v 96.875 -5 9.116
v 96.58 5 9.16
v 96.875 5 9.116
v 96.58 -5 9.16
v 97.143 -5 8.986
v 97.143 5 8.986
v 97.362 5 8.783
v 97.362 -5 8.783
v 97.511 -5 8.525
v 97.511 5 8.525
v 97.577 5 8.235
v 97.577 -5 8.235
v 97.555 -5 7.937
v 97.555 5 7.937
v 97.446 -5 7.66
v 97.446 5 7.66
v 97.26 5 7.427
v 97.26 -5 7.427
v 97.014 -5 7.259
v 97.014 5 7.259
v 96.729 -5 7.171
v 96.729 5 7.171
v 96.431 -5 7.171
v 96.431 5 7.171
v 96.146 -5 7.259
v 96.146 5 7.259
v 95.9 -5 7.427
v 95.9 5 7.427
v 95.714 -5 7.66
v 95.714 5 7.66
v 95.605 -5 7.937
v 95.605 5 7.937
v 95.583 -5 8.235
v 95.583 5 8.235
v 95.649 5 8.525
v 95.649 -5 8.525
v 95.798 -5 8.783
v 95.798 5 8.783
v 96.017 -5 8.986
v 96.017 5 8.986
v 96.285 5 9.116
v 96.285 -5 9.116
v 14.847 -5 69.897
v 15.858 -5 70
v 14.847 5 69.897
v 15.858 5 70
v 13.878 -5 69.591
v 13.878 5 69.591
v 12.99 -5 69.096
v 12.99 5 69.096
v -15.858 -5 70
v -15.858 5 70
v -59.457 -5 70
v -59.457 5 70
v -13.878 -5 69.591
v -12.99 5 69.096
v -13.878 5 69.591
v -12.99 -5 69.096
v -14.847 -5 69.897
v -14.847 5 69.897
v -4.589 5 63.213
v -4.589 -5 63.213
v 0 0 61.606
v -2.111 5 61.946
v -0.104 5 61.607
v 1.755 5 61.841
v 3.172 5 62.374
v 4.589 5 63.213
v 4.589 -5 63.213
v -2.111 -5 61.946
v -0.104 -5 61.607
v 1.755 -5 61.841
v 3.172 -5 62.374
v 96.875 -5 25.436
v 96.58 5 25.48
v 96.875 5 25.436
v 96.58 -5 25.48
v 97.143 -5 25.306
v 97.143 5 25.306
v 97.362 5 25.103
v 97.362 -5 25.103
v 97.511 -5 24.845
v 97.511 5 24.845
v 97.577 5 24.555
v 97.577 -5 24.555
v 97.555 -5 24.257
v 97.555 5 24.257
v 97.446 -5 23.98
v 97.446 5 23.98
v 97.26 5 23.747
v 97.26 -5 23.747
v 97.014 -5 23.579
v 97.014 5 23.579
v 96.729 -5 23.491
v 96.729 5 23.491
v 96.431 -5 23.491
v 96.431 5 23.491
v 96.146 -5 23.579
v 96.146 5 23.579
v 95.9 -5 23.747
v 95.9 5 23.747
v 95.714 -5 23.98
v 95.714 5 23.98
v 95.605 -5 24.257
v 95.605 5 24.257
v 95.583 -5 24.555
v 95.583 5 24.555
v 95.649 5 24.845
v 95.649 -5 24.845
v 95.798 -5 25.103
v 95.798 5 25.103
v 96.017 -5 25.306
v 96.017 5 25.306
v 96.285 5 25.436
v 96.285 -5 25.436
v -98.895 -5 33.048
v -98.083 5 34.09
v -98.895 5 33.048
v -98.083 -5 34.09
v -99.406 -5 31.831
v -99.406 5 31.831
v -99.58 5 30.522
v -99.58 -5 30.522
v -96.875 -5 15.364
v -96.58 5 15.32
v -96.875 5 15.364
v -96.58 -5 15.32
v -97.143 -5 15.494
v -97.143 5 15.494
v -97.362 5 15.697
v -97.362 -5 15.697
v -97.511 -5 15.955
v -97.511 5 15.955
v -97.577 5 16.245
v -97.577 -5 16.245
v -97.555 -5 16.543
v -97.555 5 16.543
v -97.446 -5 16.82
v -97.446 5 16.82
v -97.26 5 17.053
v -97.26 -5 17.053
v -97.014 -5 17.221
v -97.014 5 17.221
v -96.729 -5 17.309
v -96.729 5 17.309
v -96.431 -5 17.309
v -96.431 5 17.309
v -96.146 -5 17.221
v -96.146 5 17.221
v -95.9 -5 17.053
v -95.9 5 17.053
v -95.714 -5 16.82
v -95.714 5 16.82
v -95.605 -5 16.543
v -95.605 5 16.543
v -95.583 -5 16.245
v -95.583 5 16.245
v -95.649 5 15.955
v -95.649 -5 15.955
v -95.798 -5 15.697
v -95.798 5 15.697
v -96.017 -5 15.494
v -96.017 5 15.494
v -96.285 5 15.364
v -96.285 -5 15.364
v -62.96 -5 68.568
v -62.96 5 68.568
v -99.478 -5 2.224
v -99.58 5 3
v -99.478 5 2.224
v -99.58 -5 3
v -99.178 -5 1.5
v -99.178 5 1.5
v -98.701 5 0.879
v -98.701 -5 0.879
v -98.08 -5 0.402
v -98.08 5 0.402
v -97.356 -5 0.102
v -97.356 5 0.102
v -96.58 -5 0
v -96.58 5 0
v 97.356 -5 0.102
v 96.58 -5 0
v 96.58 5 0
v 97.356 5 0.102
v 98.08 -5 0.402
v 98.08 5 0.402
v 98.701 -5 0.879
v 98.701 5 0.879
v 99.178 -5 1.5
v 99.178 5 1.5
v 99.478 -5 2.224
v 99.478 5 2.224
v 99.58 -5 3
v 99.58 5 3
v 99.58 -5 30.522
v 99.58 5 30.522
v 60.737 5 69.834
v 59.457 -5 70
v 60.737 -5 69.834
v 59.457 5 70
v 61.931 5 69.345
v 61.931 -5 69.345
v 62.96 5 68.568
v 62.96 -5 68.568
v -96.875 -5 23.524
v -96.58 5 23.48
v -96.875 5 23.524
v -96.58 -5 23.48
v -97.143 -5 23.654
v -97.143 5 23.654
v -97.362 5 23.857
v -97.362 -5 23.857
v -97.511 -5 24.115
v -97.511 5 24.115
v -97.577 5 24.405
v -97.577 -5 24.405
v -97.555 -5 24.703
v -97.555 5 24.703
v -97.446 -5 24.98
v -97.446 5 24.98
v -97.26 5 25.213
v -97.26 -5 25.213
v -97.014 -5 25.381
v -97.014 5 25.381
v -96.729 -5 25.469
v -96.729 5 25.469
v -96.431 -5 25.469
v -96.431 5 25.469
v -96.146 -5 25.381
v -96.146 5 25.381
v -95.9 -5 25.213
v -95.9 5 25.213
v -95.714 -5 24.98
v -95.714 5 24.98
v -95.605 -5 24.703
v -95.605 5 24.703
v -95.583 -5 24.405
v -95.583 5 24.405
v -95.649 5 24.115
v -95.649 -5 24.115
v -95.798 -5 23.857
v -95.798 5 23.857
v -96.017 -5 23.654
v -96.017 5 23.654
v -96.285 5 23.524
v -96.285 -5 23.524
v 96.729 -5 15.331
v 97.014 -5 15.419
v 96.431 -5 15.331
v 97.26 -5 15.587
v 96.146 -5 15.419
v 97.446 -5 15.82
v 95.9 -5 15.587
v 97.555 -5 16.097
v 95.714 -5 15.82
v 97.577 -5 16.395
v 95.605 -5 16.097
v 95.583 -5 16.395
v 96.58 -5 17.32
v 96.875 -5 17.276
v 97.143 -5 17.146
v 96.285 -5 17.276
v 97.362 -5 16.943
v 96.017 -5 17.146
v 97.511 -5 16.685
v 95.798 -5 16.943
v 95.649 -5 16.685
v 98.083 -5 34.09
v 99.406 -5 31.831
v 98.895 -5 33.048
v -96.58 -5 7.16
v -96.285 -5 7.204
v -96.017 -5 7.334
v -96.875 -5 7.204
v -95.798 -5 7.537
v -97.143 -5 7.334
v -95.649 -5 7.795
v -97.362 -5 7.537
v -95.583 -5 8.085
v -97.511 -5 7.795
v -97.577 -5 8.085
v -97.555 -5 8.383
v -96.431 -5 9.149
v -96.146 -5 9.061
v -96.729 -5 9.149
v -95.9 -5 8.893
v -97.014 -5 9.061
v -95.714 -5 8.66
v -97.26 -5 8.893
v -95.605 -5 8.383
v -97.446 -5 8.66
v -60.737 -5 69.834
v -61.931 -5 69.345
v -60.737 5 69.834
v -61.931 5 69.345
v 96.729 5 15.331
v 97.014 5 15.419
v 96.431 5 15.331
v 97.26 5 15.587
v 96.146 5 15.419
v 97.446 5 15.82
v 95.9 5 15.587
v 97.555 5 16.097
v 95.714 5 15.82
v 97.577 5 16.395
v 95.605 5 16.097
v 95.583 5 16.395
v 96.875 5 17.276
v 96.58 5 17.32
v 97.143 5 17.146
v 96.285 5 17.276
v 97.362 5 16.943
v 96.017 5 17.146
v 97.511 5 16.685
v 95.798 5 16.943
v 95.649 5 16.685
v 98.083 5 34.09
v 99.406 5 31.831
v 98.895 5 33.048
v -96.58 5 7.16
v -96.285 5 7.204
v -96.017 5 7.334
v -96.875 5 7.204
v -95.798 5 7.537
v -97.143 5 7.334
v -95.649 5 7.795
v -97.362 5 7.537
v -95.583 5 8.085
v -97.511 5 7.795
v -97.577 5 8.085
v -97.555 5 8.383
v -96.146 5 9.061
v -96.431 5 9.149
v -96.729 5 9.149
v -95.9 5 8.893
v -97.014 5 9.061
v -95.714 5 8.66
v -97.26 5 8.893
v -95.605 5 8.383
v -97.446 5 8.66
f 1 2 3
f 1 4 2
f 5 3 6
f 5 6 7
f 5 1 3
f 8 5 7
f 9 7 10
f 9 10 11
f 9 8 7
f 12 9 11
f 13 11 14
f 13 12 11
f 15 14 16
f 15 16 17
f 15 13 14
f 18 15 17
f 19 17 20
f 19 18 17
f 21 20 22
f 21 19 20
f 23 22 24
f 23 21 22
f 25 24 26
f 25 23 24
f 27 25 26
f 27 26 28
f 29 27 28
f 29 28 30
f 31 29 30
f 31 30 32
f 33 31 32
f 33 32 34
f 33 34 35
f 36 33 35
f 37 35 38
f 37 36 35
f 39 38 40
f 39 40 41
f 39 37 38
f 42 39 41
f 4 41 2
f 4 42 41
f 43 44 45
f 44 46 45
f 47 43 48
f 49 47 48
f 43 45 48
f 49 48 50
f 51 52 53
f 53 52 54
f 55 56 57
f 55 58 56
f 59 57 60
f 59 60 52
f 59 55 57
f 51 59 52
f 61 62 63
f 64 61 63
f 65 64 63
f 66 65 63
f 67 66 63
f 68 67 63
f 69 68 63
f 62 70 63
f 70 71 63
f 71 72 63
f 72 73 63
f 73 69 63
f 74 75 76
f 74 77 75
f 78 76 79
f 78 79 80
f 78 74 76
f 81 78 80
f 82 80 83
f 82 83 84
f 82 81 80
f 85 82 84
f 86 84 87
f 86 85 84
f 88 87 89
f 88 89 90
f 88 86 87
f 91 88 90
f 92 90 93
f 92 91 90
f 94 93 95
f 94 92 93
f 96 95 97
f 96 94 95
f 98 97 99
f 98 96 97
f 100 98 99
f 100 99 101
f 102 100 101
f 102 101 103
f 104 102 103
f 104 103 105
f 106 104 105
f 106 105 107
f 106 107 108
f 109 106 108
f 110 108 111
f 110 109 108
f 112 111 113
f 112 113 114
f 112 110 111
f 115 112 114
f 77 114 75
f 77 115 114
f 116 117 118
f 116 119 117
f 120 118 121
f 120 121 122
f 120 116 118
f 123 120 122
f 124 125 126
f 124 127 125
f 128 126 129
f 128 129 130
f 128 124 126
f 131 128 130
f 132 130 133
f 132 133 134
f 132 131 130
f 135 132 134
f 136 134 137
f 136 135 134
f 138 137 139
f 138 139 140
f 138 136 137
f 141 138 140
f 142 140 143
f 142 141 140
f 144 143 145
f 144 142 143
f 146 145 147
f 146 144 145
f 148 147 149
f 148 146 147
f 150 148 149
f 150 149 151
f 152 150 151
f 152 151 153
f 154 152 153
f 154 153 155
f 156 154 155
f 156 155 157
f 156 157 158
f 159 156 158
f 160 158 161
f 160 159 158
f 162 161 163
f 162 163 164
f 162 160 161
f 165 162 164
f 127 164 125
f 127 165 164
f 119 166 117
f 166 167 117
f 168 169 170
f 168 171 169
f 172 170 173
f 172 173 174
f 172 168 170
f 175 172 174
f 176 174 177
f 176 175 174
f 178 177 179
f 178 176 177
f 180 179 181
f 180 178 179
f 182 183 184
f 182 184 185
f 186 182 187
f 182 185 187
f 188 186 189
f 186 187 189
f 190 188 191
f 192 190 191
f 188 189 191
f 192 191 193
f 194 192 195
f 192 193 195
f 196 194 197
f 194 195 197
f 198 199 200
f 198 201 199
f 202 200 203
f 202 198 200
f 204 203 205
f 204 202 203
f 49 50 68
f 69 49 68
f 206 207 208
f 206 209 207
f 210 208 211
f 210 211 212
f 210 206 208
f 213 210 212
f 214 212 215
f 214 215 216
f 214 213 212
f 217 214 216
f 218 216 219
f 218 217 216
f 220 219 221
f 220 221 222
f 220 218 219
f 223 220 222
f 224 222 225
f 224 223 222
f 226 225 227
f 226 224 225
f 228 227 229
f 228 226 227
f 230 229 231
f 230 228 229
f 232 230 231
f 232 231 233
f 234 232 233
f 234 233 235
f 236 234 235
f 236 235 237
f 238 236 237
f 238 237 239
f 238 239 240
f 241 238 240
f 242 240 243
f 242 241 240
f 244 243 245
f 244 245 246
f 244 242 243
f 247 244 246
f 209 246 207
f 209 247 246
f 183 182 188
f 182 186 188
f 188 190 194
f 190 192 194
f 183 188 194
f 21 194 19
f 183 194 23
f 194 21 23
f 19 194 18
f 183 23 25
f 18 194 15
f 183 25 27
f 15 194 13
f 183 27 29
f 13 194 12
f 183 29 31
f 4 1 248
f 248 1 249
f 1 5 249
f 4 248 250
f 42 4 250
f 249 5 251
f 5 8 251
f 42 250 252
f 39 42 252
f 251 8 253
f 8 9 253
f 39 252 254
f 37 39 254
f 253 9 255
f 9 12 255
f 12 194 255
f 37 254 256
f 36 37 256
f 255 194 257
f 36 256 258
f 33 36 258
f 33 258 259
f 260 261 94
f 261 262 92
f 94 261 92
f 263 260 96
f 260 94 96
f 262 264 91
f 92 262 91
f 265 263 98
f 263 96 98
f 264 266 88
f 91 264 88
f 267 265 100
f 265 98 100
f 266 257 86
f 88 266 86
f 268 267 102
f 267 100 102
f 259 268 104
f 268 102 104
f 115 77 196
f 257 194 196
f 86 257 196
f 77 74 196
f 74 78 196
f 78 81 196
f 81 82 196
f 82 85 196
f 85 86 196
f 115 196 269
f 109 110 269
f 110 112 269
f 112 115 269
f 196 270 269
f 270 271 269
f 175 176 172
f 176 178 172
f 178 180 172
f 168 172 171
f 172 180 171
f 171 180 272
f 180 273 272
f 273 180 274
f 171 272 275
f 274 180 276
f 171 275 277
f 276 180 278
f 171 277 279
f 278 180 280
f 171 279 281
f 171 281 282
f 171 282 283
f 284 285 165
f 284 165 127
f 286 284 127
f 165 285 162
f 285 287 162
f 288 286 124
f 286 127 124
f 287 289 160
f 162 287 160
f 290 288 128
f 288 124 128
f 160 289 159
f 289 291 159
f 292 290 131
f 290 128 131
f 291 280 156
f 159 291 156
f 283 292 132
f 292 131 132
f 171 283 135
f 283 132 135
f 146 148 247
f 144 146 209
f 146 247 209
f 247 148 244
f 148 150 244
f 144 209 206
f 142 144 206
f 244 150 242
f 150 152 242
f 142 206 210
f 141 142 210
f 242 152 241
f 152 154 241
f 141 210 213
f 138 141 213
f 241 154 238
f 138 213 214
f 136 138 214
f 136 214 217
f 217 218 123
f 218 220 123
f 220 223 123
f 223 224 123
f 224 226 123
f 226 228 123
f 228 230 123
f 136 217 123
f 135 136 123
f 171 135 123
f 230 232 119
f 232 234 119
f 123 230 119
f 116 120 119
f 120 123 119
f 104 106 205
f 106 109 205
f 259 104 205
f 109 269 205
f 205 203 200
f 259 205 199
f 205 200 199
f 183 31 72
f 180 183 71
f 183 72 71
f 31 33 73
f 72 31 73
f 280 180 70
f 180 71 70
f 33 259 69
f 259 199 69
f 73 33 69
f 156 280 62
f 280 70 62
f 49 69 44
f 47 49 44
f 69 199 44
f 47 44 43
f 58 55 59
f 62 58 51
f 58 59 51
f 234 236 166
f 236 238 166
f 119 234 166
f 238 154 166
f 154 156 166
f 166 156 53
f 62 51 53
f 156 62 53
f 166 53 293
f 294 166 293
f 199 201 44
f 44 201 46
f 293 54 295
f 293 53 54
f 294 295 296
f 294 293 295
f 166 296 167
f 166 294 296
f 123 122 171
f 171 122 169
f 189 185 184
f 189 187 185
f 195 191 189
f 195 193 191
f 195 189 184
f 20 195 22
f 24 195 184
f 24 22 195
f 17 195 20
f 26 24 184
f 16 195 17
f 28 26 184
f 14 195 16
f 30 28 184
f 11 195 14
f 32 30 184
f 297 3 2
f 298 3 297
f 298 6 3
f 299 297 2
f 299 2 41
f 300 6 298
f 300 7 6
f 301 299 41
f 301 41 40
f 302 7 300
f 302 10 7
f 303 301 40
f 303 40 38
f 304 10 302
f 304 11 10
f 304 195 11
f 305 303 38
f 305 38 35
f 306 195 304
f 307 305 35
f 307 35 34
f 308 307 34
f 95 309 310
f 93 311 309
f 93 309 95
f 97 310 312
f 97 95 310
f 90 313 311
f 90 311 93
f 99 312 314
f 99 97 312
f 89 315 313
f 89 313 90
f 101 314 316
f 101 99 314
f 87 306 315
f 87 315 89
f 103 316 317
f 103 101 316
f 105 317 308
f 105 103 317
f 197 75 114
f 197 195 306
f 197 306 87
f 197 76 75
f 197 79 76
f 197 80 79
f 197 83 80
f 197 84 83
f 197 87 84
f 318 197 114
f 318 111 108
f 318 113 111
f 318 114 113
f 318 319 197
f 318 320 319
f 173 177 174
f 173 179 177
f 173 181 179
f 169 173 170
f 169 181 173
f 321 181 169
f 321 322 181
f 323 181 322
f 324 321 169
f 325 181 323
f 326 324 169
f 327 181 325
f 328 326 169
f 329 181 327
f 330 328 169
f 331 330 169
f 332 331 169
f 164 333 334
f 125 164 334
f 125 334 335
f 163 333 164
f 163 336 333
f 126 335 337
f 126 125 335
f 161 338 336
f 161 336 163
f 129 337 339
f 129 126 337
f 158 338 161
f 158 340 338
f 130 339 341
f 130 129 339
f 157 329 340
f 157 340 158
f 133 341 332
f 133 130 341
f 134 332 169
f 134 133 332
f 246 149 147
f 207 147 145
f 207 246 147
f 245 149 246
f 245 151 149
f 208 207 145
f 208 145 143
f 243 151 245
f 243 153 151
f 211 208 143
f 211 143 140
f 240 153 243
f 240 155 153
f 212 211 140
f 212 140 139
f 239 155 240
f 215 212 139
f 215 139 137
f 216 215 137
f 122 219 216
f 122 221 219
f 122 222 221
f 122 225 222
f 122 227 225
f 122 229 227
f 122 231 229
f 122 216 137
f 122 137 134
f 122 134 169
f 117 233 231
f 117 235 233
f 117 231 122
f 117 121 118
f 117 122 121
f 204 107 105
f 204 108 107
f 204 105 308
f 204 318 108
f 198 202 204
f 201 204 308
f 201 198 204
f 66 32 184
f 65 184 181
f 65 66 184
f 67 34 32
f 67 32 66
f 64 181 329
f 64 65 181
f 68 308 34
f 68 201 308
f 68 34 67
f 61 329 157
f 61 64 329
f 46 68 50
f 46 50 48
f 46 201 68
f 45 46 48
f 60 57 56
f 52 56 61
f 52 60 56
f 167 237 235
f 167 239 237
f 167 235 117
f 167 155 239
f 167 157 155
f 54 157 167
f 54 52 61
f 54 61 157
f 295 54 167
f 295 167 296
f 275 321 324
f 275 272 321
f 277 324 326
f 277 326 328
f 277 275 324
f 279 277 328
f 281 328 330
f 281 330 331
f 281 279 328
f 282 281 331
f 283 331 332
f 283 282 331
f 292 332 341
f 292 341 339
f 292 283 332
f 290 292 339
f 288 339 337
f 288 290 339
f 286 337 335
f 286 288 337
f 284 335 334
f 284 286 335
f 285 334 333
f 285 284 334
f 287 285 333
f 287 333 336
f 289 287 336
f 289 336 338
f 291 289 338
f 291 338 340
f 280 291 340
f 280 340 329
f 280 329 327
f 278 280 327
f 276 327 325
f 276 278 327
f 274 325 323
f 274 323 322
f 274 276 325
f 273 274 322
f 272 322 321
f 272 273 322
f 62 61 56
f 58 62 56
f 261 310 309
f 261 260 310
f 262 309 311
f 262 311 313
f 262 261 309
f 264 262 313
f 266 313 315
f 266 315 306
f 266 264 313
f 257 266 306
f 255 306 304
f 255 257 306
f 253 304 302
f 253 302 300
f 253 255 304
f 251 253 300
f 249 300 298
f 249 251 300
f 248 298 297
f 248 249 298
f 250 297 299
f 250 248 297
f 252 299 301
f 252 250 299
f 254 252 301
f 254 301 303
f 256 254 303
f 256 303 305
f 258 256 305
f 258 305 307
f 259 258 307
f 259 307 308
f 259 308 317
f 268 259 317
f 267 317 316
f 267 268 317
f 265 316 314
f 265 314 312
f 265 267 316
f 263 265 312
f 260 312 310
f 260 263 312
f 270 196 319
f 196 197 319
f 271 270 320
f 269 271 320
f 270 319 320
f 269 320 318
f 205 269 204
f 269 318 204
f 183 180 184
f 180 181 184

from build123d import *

# Parameters (mm, degrees)
SKETCH1_R           = 1
BOSS_EXTRUDE1_DEPTH = 5
FILLET1_R           = 5
FILLET2_R           = 5
FILLET3_R           = 5
FILLET4_R           = 3


with BuildPart() as part:
    # Sketch1 → Boss-Extrude1 (new, symmetric)
    with BuildSketch(Plane(origin=(0, 0, 0), x_dir=(1, 0, 0), z_dir=(0, 1, 0))):
        Polygon((0, -60), (-14.281480067, -70), (-61.501480067, -70), (-99.58, -32.62), (-99.58, 0), (99.58, 0), (99.58, -32.62), (61.501480067, -70), (14.281480067, -70), align=None)
        with Locations(Location((96.58, -8.16, 0), (0, 0, 270))):
            Circle(SKETCH1_R, mode=Mode.SUBTRACT)
        with Locations(Location((96.58, -16.32, 0), (0, 0, 270))):
            Circle(SKETCH1_R, mode=Mode.SUBTRACT)
        with Locations(Location((96.58, -24.48, 0), (0, 0, 270))):
            Circle(SKETCH1_R, mode=Mode.SUBTRACT)
        with Locations(Location((-96.58, -24.48, 0), (0, 0, 90))):
            Circle(SKETCH1_R, mode=Mode.SUBTRACT)
        with Locations(Location((-96.58, -16.32, 0), (0, 0, 90))):
            Circle(SKETCH1_R, mode=Mode.SUBTRACT)
        with Locations(Location((-96.58, -8.16, 0), (0, 0, 90))):
            Circle(SKETCH1_R, mode=Mode.SUBTRACT)
    extrude(amount=BOSS_EXTRUDE1_DEPTH, both=True)

    # Fillet1
    fillet1_edges = [part.edges().sort_by_distance(p)[0] for p in [
        (-14.281480067, 0, 70),
        (14.281480067, 0, 70),
    ]]
    fillet(fillet1_edges, radius=FILLET1_R)

    # Fillet2
    fillet2_edges = [part.edges().sort_by_distance(p)[0] for p in [
        (-61.501480067, 0, 70),
        (61.501480067, 0, 70),
    ]]
    fillet(fillet2_edges, radius=FILLET2_R)

    # Fillet3
    fillet3_edges = [part.edges().sort_by_distance(p)[0] for p in [
        (-99.58, 0, 32.62),
        (99.58, 0, 32.62),
    ]]
    fillet(fillet3_edges, radius=FILLET3_R)

    # Fillet4
    fillet4_edges = [part.edges().sort_by_distance(p)[0] for p in [
        (-99.58, 0, 0),
        (99.58, 0, 0),
    ]]
    fillet(fillet4_edges, radius=FILLET4_R)

    # Fillet5
    # a fillet whose section is not a circle: 8 mm, written as the material it adds along each edge
    with BuildSketch(Plane(origin=(0, -5, 60), x_dir=(-0.8191520442889911, 0, 0.5735764363510473), z_dir=(0, 1, 0))) as fillet5_piece_1:
        with BuildLine():
            Bezier((5.601660306, 0), (0, 0), (-1.915880661, 5.263838853), weights=[1, 1, 1])
            Line((-1.915880661, 5.263838853), (0, 0))
            Line((0, 0), (5.601660306, 0))
        make_face()
    extrude(amount=10)


solid = part.part
